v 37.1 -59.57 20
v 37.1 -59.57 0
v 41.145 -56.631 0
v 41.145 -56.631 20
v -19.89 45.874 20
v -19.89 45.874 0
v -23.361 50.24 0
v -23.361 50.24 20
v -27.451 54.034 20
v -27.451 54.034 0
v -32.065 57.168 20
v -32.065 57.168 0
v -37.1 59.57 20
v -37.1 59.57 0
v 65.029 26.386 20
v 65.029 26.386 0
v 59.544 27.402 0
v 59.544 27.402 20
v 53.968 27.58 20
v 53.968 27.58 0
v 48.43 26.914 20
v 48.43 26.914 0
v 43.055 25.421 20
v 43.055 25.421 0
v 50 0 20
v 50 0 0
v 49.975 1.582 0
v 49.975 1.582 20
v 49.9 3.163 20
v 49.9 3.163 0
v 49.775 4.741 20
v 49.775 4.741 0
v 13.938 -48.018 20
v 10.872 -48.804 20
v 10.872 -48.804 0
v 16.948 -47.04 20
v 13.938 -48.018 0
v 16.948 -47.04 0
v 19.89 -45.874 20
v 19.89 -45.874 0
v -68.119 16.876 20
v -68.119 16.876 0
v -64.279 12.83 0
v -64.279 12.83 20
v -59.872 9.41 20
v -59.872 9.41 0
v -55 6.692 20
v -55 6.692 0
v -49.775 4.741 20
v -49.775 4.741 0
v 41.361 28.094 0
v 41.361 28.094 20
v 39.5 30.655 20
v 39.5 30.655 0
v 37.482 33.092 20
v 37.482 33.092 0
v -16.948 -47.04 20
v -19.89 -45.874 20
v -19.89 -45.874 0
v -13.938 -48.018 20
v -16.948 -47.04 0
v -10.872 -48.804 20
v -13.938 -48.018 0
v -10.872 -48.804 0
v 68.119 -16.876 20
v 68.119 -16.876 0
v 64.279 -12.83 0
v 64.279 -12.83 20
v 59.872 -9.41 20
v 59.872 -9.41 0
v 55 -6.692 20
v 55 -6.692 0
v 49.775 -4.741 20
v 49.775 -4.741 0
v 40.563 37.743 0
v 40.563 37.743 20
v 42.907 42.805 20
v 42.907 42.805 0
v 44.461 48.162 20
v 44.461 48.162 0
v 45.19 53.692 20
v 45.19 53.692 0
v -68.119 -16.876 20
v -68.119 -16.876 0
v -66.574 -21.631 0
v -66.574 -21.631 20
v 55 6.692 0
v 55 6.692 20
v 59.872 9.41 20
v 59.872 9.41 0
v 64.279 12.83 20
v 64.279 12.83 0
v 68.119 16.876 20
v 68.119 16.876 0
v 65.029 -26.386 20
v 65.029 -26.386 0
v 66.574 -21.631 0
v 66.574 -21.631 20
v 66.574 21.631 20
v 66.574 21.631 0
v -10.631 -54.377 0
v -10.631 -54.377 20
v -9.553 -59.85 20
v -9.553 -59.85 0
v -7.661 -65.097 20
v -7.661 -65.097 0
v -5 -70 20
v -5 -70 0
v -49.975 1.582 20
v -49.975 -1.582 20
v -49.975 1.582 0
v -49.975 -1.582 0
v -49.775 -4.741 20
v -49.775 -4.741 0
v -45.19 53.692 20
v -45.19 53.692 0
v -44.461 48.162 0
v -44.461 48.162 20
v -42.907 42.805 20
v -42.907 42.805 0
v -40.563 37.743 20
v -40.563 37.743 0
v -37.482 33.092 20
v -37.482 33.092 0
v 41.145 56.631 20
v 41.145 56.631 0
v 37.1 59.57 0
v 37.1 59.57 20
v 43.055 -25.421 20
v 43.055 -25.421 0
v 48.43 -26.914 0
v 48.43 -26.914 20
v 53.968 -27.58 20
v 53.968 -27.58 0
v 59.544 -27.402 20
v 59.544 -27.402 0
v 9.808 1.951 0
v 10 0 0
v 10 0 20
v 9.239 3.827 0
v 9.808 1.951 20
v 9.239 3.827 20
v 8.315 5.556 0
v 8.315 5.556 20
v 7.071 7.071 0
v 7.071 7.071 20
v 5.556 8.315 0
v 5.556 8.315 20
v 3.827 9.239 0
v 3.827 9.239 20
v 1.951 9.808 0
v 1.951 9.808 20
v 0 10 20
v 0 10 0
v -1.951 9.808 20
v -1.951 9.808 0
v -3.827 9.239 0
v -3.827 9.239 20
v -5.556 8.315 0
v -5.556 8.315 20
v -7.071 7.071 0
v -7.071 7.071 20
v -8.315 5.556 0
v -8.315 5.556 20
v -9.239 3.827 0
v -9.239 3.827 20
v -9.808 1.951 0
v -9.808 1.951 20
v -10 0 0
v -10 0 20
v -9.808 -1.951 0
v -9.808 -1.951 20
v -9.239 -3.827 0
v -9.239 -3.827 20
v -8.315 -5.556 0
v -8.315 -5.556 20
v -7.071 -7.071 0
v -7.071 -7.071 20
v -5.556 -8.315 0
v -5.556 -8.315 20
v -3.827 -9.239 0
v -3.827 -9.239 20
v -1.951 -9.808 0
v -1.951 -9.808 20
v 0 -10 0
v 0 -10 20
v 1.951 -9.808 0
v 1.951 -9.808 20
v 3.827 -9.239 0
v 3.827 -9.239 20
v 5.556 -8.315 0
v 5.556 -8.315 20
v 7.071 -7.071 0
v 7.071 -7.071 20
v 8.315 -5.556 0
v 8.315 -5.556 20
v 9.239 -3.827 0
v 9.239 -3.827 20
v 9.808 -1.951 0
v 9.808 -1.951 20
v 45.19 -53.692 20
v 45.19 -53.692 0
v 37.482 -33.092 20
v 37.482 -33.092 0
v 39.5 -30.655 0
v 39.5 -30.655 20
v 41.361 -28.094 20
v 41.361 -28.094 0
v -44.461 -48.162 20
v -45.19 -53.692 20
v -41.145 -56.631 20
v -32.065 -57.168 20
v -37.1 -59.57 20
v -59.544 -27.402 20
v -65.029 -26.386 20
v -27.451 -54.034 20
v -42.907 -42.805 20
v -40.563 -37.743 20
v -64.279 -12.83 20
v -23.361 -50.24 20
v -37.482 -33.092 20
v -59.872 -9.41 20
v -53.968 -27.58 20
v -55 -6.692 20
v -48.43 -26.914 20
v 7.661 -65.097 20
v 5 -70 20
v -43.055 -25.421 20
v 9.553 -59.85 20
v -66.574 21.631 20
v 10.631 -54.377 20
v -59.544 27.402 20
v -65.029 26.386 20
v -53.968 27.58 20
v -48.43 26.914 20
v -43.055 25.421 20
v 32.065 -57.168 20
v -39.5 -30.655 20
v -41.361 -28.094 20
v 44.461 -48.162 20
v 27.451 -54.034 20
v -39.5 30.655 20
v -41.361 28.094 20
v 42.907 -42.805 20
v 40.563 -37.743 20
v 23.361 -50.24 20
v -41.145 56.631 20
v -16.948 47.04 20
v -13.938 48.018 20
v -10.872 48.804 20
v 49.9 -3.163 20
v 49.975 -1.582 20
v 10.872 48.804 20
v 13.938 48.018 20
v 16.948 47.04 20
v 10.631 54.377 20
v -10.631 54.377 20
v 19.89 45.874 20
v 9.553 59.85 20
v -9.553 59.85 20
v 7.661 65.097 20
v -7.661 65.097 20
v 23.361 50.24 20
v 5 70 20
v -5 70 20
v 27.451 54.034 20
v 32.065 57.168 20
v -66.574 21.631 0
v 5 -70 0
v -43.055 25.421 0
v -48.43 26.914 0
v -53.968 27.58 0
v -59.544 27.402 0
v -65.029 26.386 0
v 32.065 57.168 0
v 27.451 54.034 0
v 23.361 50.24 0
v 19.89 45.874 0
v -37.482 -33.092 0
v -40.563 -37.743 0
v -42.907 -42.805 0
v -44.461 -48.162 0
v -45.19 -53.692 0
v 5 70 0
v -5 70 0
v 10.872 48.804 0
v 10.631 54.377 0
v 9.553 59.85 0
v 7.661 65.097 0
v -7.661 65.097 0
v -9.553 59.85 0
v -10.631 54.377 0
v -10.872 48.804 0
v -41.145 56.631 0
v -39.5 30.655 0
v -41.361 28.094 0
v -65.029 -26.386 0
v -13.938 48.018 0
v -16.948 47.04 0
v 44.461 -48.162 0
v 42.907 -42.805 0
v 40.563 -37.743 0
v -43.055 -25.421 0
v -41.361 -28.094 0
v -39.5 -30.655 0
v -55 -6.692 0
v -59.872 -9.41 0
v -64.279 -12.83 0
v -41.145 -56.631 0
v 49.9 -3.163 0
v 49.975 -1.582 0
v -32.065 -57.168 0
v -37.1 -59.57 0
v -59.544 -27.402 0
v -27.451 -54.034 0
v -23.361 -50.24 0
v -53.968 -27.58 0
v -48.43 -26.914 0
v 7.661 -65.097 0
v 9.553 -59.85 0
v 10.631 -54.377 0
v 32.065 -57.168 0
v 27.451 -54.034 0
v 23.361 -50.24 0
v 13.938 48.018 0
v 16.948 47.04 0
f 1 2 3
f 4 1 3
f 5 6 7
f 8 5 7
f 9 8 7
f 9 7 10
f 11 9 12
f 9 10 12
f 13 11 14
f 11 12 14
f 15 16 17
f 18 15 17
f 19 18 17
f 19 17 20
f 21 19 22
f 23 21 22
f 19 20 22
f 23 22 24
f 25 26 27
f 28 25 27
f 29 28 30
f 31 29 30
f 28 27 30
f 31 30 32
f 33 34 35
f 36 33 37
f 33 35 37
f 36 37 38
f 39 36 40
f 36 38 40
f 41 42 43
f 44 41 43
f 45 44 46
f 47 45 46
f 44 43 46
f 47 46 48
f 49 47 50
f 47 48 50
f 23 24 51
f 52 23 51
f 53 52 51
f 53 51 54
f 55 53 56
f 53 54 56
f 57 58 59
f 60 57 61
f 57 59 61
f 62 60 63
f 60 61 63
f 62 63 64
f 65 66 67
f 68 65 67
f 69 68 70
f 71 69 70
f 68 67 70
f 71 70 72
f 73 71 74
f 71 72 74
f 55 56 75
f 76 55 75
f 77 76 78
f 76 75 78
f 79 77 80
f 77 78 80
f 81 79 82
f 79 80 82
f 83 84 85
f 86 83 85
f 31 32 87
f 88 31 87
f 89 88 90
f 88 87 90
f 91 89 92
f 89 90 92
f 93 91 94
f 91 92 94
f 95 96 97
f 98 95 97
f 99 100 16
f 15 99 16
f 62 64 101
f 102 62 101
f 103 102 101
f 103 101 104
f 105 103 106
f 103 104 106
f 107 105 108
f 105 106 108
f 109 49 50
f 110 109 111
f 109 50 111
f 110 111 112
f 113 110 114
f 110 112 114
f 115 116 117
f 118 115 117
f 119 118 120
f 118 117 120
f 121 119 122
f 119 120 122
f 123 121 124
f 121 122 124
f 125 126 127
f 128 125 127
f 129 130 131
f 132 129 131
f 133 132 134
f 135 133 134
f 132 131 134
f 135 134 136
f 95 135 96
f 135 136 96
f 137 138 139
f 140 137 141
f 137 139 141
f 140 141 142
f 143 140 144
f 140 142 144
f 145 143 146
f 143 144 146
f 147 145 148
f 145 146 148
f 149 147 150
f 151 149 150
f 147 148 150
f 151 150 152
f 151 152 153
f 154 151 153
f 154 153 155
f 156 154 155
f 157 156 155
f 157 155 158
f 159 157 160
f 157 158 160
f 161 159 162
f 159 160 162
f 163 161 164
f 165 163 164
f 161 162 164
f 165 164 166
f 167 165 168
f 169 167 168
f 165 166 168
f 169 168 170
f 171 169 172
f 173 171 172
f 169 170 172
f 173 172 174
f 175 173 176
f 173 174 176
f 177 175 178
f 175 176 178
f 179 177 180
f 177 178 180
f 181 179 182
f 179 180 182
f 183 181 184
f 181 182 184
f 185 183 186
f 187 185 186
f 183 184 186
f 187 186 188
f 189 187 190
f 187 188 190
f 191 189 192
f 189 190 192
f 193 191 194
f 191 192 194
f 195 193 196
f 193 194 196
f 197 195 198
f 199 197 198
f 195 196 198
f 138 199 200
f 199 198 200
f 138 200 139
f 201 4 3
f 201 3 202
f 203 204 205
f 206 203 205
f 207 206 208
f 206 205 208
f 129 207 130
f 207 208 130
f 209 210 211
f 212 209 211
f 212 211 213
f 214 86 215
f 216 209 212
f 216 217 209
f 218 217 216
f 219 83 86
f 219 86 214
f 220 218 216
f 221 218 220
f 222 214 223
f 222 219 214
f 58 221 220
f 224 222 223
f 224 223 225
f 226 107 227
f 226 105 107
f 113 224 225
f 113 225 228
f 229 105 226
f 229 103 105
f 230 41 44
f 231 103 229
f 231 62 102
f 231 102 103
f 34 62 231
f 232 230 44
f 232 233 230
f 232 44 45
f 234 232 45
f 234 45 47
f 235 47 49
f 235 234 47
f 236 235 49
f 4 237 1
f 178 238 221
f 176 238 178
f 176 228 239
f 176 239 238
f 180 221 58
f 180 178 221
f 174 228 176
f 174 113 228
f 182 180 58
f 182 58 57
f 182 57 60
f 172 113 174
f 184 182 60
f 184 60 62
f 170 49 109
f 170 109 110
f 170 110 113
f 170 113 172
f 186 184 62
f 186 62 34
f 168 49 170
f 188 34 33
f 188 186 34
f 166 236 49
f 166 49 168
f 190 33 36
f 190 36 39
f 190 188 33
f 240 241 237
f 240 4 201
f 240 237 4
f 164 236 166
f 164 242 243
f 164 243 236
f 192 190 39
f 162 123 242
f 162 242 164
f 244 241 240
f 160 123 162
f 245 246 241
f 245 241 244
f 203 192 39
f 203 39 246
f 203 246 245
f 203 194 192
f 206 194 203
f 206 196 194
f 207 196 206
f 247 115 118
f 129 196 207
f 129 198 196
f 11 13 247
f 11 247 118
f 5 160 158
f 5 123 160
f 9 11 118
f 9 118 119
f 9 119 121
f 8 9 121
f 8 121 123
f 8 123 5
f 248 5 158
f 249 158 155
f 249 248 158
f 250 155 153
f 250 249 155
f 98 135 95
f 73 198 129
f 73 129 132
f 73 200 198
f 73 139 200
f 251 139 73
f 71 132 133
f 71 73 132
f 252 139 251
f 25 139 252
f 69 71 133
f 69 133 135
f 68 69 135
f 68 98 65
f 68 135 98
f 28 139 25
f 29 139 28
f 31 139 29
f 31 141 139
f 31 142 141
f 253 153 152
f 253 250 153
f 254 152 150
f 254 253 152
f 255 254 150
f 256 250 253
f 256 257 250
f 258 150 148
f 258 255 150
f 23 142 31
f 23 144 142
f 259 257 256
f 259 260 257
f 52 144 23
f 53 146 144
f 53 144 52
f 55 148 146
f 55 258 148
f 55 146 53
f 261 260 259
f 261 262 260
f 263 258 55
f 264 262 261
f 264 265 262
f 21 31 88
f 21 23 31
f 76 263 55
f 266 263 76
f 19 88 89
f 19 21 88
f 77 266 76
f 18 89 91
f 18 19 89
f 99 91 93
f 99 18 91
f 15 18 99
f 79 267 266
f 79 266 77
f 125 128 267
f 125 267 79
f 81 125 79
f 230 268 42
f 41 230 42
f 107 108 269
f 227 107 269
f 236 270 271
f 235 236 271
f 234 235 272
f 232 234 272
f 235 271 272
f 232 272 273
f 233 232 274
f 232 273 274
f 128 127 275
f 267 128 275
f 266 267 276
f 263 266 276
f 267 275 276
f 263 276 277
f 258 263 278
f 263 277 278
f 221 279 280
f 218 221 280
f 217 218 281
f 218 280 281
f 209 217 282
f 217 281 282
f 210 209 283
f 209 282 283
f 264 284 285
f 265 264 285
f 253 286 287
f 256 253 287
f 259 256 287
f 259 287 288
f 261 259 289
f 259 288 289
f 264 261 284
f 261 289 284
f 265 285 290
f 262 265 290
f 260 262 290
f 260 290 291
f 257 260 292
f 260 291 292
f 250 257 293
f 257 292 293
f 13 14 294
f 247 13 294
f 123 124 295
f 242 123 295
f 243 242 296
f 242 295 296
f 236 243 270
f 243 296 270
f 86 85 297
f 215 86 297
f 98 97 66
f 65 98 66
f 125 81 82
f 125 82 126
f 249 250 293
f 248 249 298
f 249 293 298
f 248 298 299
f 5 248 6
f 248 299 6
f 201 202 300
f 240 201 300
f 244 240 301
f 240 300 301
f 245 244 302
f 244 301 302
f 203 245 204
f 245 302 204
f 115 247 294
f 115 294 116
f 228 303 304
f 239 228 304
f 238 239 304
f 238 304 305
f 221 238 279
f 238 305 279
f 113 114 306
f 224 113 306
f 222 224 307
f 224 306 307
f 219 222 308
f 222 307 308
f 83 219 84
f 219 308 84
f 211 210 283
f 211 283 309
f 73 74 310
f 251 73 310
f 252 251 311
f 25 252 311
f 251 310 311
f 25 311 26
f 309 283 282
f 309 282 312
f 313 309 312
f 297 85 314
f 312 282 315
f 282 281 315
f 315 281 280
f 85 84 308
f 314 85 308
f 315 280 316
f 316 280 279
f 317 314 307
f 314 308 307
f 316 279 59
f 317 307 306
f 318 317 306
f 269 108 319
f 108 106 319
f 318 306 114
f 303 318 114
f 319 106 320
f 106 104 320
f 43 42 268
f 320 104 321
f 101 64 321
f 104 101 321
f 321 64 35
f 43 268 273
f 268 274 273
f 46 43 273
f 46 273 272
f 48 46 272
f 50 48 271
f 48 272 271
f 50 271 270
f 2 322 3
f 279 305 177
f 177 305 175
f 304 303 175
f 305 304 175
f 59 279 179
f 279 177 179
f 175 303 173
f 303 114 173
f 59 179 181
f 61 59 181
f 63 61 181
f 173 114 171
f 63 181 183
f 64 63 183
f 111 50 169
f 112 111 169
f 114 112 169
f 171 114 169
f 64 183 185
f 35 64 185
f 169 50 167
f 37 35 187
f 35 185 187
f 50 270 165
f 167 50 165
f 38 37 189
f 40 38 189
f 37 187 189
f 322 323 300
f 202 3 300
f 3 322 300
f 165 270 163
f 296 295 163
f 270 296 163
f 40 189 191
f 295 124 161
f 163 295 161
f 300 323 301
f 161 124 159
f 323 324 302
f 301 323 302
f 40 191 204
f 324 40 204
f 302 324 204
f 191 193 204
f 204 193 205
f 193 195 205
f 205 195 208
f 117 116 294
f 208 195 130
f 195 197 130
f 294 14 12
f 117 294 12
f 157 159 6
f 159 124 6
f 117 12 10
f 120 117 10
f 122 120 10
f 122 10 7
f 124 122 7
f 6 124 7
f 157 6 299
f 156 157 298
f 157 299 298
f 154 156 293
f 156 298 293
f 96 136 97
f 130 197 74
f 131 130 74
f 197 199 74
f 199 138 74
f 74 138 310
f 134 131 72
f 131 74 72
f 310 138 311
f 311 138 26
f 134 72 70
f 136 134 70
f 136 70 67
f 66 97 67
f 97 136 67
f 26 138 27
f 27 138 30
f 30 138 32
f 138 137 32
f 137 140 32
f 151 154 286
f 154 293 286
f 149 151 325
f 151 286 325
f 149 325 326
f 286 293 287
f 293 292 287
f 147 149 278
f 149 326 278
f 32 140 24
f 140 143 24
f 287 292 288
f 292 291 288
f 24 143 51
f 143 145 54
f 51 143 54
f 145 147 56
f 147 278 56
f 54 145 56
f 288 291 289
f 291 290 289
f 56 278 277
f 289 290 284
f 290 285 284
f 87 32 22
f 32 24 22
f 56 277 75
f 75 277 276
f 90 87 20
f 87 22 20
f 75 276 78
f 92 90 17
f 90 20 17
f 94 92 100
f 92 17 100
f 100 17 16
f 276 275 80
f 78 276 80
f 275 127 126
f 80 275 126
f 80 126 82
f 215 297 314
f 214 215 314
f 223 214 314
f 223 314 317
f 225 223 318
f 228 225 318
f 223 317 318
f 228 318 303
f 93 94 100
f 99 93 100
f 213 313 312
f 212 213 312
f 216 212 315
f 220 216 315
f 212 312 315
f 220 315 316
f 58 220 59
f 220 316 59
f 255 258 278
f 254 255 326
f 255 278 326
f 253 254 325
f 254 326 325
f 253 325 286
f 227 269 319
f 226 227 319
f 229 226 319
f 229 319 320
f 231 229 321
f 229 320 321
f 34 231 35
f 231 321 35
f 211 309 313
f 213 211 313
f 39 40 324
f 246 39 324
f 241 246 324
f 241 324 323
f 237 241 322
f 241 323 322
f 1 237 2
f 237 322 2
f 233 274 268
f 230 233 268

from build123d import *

# Parameters (mm, degrees)
F1_DEPTH = 20
F2_R     = 10
F3_DEPTH = 20


with BuildPart() as f1:
    # F0 (on Top) → F1 (new body)
    with BuildSketch(Plane.XY):
        with BuildLine():
            ThreePointArc((49.774727, -4.740946), (49.94365, -2.373147), (50, 0))
            ThreePointArc((50, 0), (49.94365, 2.373147), (49.774727, 4.740946))
            ThreePointArc((49.774727, 4.740946), (47.552826, 15.45085), (43.055258, 25.421345))
            ThreePointArc((43.055258, 25.421345), (40.45085, 29.389263), (37.481942, 33.092356))
            ThreePointArc((37.481942, 33.092356), (29.389263, 40.45085), (19.890144, 45.873546))
            ThreePointArc((19.890144, 45.873546), (15.45085, 47.552826), (10.872329, 48.803611))
            ThreePointArc((10.872329, 48.803611), (5.468978, 49.700003), (0, 50))
            ThreePointArc((0, 50), (-5.468978, 49.700003), (-10.872329, 48.803611))
            ThreePointArc((-10.872329, 48.803611), (-15.45085, 47.552826), (-19.890144, 45.873546))
            ThreePointArc((-19.890144, 45.873546), (-29.389263, 40.45085), (-37.481942, 33.092356))
            ThreePointArc((-37.481942, 33.092356), (-40.45085, 29.389263), (-43.055258, 25.421345))
            ThreePointArc((-43.055258, 25.421345), (-47.552826, 15.45085), (-49.774727, 4.740946))
            ThreePointArc((-49.774727, 4.740946), (-50, 0), (-49.774727, -4.740946))
            ThreePointArc((-49.774727, -4.740946), (-47.552826, -15.45085), (-43.055258, -25.421345))
            ThreePointArc((-43.055258, -25.421345), (-40.45085, -29.389263), (-37.481942, -33.092356))
            ThreePointArc((-37.481942, -33.092356), (-29.389263, -40.45085), (-19.890144, -45.873546))
            ThreePointArc((-19.890144, -45.873546), (-15.45085, -47.552826), (-10.872329, -48.803611))
            ThreePointArc((-10.872329, -48.803611), (0, -50), (10.872329, -48.803611))
            ThreePointArc((10.872329, -48.803611), (15.45085, -47.552826), (19.890144, -45.873546))
            ThreePointArc((19.890144, -45.873546), (29.389263, -40.45085), (37.481942, -33.092356))
            ThreePointArc((37.481942, -33.092356), (40.45085, -29.389263), (43.055258, -25.421345))
            ThreePointArc((43.055258, -25.421345), (47.552826, -15.45085), (49.774727, -4.740946))
        make_face()
        with BuildLine():
            ThreePointArc((43.055258, 25.421345), (47.552826, 15.45085), (49.774727, 4.740946))
            ThreePointArc((49.774727, 4.740946), (59.872276, 9.409519), (68.119041, 16.875907))
            Line((68.119041, 16.875907), (66.573956, 21.63119))
            Line((66.573956, 21.63119), (65.028871, 26.386472))
            ThreePointArc((65.028871, 26.386472), (53.968465, 27.57958), (43.055258, 25.421345))
        make_face()
        with BuildLine():
            ThreePointArc((68.119041, -16.875907), (59.872276, -9.409519), (49.774727, -4.740946))
            ThreePointArc((49.774727, -4.740946), (47.552826, -15.45085), (43.055258, -25.421345))
            ThreePointArc((43.055258, -25.421345), (53.968465, -27.57958), (65.028871, -26.386472))
            Line((65.028871, -26.386472), (66.573956, -21.63119))
            Line((66.573956, -21.63119), (68.119041, -16.875907))
        make_face()
        with BuildLine():
            ThreePointArc((19.890144, 45.873546), (29.389263, 40.45085), (37.481942, 33.092356))
            ThreePointArc((37.481942, 33.092356), (42.906913, 42.804502), (45.190053, 53.692263))
            Line((45.190053, 53.692263), (41.144968, 56.63119))
            Line((41.144968, 56.63119), (37.099883, 59.570116))
            ThreePointArc((37.099883, 59.570116), (27.450535, 54.034217), (19.890144, 45.873546))
        make_face()
        with BuildLine():
            ThreePointArc((45.190053, -53.692263), (42.906913, -42.804502), (37.481942, -33.092356))
            ThreePointArc((37.481942, -33.092356), (29.389263, -40.45085), (19.890144, -45.873546))
            ThreePointArc((19.890144, -45.873546), (27.450535, -54.034217), (37.099883, -59.570116))
            Line((37.099883, -59.570116), (41.144968, -56.63119))
            Line((41.144968, -56.63119), (45.190053, -53.692263))
        make_face()
        with BuildLine():
            ThreePointArc((0, 50), (5.468978, 49.700003), (10.872329, 48.803611))
            ThreePointArc((10.872329, 48.803611), (9.552567, 59.84962), (5, 70))
            Line((5, 70), (0, 70))
            Line((0, 70), (0, 50))
        make_face()
        with BuildLine():
            ThreePointArc((5, -70), (9.552567, -59.84962), (10.872329, -48.803611))
            ThreePointArc((10.872329, -48.803611), (0, -50), (-10.872329, -48.803611))
            ThreePointArc((-10.872329, -48.803611), (-9.552567, -59.84962), (-5, -70))
            Line((-5, -70), (0, -70))
            Line((0, -70), (5, -70))
        make_face()
        with BuildLine():
            ThreePointArc((-10.872329, 48.803611), (-5.468978, 49.700003), (0, 50))
            Line((0, 50), (0, 70))
            Line((0, 70), (-5, 70))
            ThreePointArc((-5, 70), (-9.552567, 59.84962), (-10.872329, 48.803611))
        make_face()
        with BuildLine():
            ThreePointArc((-37.099883, -59.570116), (-27.450535, -54.034217), (-19.890144, -45.873546))
            ThreePointArc((-19.890144, -45.873546), (-29.389263, -40.45085), (-37.481942, -33.092356))
            ThreePointArc((-37.481942, -33.092356), (-42.906913, -42.804502), (-45.190053, -53.692263))
            Line((-45.190053, -53.692263), (-41.144968, -56.63119))
            Line((-41.144968, -56.63119), (-37.099883, -59.570116))
        make_face()
        with BuildLine():
            ThreePointArc((-37.481942, 33.092356), (-29.389263, 40.45085), (-19.890144, 45.873546))
            ThreePointArc((-19.890144, 45.873546), (-27.450535, 54.034217), (-37.099883, 59.570116))
            Line((-37.099883, 59.570116), (-41.144968, 56.63119))
            Line((-41.144968, 56.63119), (-45.190053, 53.692263))
            ThreePointArc((-45.190053, 53.692263), (-42.906913, 42.804502), (-37.481942, 33.092356))
        make_face()
        with BuildLine():
            ThreePointArc((-65.028871, -26.386472), (-53.968465, -27.57958), (-43.055258, -25.421345))
            ThreePointArc((-43.055258, -25.421345), (-47.552826, -15.45085), (-49.774727, -4.740946))
            ThreePointArc((-49.774727, -4.740946), (-59.872276, -9.409519), (-68.119041, -16.875907))
            Line((-68.119041, -16.875907), (-66.573956, -21.63119))
            Line((-66.573956, -21.63119), (-65.028871, -26.386472))
        make_face()
        with BuildLine():
            ThreePointArc((-49.774727, 4.740946), (-47.552826, 15.45085), (-43.055258, 25.421345))
            ThreePointArc((-43.055258, 25.421345), (-53.968465, 27.57958), (-65.028871, 26.386472))
            Line((-65.028871, 26.386472), (-66.573956, 21.63119))
            Line((-66.573956, 21.63119), (-68.119041, 16.875907))
            ThreePointArc((-68.119041, 16.875907), (-59.872276, 9.409519), (-49.774727, 4.740946))
        make_face()
    extrude(amount=F1_DEPTH)

    # F2 (on face) → F3 (cut, through all)
    with BuildSketch(Plane.XY.offset(20)):
        Circle(F2_R)
    extrude(amount=-F3_DEPTH, mode=Mode.SUBTRACT)


solid = f1.part
